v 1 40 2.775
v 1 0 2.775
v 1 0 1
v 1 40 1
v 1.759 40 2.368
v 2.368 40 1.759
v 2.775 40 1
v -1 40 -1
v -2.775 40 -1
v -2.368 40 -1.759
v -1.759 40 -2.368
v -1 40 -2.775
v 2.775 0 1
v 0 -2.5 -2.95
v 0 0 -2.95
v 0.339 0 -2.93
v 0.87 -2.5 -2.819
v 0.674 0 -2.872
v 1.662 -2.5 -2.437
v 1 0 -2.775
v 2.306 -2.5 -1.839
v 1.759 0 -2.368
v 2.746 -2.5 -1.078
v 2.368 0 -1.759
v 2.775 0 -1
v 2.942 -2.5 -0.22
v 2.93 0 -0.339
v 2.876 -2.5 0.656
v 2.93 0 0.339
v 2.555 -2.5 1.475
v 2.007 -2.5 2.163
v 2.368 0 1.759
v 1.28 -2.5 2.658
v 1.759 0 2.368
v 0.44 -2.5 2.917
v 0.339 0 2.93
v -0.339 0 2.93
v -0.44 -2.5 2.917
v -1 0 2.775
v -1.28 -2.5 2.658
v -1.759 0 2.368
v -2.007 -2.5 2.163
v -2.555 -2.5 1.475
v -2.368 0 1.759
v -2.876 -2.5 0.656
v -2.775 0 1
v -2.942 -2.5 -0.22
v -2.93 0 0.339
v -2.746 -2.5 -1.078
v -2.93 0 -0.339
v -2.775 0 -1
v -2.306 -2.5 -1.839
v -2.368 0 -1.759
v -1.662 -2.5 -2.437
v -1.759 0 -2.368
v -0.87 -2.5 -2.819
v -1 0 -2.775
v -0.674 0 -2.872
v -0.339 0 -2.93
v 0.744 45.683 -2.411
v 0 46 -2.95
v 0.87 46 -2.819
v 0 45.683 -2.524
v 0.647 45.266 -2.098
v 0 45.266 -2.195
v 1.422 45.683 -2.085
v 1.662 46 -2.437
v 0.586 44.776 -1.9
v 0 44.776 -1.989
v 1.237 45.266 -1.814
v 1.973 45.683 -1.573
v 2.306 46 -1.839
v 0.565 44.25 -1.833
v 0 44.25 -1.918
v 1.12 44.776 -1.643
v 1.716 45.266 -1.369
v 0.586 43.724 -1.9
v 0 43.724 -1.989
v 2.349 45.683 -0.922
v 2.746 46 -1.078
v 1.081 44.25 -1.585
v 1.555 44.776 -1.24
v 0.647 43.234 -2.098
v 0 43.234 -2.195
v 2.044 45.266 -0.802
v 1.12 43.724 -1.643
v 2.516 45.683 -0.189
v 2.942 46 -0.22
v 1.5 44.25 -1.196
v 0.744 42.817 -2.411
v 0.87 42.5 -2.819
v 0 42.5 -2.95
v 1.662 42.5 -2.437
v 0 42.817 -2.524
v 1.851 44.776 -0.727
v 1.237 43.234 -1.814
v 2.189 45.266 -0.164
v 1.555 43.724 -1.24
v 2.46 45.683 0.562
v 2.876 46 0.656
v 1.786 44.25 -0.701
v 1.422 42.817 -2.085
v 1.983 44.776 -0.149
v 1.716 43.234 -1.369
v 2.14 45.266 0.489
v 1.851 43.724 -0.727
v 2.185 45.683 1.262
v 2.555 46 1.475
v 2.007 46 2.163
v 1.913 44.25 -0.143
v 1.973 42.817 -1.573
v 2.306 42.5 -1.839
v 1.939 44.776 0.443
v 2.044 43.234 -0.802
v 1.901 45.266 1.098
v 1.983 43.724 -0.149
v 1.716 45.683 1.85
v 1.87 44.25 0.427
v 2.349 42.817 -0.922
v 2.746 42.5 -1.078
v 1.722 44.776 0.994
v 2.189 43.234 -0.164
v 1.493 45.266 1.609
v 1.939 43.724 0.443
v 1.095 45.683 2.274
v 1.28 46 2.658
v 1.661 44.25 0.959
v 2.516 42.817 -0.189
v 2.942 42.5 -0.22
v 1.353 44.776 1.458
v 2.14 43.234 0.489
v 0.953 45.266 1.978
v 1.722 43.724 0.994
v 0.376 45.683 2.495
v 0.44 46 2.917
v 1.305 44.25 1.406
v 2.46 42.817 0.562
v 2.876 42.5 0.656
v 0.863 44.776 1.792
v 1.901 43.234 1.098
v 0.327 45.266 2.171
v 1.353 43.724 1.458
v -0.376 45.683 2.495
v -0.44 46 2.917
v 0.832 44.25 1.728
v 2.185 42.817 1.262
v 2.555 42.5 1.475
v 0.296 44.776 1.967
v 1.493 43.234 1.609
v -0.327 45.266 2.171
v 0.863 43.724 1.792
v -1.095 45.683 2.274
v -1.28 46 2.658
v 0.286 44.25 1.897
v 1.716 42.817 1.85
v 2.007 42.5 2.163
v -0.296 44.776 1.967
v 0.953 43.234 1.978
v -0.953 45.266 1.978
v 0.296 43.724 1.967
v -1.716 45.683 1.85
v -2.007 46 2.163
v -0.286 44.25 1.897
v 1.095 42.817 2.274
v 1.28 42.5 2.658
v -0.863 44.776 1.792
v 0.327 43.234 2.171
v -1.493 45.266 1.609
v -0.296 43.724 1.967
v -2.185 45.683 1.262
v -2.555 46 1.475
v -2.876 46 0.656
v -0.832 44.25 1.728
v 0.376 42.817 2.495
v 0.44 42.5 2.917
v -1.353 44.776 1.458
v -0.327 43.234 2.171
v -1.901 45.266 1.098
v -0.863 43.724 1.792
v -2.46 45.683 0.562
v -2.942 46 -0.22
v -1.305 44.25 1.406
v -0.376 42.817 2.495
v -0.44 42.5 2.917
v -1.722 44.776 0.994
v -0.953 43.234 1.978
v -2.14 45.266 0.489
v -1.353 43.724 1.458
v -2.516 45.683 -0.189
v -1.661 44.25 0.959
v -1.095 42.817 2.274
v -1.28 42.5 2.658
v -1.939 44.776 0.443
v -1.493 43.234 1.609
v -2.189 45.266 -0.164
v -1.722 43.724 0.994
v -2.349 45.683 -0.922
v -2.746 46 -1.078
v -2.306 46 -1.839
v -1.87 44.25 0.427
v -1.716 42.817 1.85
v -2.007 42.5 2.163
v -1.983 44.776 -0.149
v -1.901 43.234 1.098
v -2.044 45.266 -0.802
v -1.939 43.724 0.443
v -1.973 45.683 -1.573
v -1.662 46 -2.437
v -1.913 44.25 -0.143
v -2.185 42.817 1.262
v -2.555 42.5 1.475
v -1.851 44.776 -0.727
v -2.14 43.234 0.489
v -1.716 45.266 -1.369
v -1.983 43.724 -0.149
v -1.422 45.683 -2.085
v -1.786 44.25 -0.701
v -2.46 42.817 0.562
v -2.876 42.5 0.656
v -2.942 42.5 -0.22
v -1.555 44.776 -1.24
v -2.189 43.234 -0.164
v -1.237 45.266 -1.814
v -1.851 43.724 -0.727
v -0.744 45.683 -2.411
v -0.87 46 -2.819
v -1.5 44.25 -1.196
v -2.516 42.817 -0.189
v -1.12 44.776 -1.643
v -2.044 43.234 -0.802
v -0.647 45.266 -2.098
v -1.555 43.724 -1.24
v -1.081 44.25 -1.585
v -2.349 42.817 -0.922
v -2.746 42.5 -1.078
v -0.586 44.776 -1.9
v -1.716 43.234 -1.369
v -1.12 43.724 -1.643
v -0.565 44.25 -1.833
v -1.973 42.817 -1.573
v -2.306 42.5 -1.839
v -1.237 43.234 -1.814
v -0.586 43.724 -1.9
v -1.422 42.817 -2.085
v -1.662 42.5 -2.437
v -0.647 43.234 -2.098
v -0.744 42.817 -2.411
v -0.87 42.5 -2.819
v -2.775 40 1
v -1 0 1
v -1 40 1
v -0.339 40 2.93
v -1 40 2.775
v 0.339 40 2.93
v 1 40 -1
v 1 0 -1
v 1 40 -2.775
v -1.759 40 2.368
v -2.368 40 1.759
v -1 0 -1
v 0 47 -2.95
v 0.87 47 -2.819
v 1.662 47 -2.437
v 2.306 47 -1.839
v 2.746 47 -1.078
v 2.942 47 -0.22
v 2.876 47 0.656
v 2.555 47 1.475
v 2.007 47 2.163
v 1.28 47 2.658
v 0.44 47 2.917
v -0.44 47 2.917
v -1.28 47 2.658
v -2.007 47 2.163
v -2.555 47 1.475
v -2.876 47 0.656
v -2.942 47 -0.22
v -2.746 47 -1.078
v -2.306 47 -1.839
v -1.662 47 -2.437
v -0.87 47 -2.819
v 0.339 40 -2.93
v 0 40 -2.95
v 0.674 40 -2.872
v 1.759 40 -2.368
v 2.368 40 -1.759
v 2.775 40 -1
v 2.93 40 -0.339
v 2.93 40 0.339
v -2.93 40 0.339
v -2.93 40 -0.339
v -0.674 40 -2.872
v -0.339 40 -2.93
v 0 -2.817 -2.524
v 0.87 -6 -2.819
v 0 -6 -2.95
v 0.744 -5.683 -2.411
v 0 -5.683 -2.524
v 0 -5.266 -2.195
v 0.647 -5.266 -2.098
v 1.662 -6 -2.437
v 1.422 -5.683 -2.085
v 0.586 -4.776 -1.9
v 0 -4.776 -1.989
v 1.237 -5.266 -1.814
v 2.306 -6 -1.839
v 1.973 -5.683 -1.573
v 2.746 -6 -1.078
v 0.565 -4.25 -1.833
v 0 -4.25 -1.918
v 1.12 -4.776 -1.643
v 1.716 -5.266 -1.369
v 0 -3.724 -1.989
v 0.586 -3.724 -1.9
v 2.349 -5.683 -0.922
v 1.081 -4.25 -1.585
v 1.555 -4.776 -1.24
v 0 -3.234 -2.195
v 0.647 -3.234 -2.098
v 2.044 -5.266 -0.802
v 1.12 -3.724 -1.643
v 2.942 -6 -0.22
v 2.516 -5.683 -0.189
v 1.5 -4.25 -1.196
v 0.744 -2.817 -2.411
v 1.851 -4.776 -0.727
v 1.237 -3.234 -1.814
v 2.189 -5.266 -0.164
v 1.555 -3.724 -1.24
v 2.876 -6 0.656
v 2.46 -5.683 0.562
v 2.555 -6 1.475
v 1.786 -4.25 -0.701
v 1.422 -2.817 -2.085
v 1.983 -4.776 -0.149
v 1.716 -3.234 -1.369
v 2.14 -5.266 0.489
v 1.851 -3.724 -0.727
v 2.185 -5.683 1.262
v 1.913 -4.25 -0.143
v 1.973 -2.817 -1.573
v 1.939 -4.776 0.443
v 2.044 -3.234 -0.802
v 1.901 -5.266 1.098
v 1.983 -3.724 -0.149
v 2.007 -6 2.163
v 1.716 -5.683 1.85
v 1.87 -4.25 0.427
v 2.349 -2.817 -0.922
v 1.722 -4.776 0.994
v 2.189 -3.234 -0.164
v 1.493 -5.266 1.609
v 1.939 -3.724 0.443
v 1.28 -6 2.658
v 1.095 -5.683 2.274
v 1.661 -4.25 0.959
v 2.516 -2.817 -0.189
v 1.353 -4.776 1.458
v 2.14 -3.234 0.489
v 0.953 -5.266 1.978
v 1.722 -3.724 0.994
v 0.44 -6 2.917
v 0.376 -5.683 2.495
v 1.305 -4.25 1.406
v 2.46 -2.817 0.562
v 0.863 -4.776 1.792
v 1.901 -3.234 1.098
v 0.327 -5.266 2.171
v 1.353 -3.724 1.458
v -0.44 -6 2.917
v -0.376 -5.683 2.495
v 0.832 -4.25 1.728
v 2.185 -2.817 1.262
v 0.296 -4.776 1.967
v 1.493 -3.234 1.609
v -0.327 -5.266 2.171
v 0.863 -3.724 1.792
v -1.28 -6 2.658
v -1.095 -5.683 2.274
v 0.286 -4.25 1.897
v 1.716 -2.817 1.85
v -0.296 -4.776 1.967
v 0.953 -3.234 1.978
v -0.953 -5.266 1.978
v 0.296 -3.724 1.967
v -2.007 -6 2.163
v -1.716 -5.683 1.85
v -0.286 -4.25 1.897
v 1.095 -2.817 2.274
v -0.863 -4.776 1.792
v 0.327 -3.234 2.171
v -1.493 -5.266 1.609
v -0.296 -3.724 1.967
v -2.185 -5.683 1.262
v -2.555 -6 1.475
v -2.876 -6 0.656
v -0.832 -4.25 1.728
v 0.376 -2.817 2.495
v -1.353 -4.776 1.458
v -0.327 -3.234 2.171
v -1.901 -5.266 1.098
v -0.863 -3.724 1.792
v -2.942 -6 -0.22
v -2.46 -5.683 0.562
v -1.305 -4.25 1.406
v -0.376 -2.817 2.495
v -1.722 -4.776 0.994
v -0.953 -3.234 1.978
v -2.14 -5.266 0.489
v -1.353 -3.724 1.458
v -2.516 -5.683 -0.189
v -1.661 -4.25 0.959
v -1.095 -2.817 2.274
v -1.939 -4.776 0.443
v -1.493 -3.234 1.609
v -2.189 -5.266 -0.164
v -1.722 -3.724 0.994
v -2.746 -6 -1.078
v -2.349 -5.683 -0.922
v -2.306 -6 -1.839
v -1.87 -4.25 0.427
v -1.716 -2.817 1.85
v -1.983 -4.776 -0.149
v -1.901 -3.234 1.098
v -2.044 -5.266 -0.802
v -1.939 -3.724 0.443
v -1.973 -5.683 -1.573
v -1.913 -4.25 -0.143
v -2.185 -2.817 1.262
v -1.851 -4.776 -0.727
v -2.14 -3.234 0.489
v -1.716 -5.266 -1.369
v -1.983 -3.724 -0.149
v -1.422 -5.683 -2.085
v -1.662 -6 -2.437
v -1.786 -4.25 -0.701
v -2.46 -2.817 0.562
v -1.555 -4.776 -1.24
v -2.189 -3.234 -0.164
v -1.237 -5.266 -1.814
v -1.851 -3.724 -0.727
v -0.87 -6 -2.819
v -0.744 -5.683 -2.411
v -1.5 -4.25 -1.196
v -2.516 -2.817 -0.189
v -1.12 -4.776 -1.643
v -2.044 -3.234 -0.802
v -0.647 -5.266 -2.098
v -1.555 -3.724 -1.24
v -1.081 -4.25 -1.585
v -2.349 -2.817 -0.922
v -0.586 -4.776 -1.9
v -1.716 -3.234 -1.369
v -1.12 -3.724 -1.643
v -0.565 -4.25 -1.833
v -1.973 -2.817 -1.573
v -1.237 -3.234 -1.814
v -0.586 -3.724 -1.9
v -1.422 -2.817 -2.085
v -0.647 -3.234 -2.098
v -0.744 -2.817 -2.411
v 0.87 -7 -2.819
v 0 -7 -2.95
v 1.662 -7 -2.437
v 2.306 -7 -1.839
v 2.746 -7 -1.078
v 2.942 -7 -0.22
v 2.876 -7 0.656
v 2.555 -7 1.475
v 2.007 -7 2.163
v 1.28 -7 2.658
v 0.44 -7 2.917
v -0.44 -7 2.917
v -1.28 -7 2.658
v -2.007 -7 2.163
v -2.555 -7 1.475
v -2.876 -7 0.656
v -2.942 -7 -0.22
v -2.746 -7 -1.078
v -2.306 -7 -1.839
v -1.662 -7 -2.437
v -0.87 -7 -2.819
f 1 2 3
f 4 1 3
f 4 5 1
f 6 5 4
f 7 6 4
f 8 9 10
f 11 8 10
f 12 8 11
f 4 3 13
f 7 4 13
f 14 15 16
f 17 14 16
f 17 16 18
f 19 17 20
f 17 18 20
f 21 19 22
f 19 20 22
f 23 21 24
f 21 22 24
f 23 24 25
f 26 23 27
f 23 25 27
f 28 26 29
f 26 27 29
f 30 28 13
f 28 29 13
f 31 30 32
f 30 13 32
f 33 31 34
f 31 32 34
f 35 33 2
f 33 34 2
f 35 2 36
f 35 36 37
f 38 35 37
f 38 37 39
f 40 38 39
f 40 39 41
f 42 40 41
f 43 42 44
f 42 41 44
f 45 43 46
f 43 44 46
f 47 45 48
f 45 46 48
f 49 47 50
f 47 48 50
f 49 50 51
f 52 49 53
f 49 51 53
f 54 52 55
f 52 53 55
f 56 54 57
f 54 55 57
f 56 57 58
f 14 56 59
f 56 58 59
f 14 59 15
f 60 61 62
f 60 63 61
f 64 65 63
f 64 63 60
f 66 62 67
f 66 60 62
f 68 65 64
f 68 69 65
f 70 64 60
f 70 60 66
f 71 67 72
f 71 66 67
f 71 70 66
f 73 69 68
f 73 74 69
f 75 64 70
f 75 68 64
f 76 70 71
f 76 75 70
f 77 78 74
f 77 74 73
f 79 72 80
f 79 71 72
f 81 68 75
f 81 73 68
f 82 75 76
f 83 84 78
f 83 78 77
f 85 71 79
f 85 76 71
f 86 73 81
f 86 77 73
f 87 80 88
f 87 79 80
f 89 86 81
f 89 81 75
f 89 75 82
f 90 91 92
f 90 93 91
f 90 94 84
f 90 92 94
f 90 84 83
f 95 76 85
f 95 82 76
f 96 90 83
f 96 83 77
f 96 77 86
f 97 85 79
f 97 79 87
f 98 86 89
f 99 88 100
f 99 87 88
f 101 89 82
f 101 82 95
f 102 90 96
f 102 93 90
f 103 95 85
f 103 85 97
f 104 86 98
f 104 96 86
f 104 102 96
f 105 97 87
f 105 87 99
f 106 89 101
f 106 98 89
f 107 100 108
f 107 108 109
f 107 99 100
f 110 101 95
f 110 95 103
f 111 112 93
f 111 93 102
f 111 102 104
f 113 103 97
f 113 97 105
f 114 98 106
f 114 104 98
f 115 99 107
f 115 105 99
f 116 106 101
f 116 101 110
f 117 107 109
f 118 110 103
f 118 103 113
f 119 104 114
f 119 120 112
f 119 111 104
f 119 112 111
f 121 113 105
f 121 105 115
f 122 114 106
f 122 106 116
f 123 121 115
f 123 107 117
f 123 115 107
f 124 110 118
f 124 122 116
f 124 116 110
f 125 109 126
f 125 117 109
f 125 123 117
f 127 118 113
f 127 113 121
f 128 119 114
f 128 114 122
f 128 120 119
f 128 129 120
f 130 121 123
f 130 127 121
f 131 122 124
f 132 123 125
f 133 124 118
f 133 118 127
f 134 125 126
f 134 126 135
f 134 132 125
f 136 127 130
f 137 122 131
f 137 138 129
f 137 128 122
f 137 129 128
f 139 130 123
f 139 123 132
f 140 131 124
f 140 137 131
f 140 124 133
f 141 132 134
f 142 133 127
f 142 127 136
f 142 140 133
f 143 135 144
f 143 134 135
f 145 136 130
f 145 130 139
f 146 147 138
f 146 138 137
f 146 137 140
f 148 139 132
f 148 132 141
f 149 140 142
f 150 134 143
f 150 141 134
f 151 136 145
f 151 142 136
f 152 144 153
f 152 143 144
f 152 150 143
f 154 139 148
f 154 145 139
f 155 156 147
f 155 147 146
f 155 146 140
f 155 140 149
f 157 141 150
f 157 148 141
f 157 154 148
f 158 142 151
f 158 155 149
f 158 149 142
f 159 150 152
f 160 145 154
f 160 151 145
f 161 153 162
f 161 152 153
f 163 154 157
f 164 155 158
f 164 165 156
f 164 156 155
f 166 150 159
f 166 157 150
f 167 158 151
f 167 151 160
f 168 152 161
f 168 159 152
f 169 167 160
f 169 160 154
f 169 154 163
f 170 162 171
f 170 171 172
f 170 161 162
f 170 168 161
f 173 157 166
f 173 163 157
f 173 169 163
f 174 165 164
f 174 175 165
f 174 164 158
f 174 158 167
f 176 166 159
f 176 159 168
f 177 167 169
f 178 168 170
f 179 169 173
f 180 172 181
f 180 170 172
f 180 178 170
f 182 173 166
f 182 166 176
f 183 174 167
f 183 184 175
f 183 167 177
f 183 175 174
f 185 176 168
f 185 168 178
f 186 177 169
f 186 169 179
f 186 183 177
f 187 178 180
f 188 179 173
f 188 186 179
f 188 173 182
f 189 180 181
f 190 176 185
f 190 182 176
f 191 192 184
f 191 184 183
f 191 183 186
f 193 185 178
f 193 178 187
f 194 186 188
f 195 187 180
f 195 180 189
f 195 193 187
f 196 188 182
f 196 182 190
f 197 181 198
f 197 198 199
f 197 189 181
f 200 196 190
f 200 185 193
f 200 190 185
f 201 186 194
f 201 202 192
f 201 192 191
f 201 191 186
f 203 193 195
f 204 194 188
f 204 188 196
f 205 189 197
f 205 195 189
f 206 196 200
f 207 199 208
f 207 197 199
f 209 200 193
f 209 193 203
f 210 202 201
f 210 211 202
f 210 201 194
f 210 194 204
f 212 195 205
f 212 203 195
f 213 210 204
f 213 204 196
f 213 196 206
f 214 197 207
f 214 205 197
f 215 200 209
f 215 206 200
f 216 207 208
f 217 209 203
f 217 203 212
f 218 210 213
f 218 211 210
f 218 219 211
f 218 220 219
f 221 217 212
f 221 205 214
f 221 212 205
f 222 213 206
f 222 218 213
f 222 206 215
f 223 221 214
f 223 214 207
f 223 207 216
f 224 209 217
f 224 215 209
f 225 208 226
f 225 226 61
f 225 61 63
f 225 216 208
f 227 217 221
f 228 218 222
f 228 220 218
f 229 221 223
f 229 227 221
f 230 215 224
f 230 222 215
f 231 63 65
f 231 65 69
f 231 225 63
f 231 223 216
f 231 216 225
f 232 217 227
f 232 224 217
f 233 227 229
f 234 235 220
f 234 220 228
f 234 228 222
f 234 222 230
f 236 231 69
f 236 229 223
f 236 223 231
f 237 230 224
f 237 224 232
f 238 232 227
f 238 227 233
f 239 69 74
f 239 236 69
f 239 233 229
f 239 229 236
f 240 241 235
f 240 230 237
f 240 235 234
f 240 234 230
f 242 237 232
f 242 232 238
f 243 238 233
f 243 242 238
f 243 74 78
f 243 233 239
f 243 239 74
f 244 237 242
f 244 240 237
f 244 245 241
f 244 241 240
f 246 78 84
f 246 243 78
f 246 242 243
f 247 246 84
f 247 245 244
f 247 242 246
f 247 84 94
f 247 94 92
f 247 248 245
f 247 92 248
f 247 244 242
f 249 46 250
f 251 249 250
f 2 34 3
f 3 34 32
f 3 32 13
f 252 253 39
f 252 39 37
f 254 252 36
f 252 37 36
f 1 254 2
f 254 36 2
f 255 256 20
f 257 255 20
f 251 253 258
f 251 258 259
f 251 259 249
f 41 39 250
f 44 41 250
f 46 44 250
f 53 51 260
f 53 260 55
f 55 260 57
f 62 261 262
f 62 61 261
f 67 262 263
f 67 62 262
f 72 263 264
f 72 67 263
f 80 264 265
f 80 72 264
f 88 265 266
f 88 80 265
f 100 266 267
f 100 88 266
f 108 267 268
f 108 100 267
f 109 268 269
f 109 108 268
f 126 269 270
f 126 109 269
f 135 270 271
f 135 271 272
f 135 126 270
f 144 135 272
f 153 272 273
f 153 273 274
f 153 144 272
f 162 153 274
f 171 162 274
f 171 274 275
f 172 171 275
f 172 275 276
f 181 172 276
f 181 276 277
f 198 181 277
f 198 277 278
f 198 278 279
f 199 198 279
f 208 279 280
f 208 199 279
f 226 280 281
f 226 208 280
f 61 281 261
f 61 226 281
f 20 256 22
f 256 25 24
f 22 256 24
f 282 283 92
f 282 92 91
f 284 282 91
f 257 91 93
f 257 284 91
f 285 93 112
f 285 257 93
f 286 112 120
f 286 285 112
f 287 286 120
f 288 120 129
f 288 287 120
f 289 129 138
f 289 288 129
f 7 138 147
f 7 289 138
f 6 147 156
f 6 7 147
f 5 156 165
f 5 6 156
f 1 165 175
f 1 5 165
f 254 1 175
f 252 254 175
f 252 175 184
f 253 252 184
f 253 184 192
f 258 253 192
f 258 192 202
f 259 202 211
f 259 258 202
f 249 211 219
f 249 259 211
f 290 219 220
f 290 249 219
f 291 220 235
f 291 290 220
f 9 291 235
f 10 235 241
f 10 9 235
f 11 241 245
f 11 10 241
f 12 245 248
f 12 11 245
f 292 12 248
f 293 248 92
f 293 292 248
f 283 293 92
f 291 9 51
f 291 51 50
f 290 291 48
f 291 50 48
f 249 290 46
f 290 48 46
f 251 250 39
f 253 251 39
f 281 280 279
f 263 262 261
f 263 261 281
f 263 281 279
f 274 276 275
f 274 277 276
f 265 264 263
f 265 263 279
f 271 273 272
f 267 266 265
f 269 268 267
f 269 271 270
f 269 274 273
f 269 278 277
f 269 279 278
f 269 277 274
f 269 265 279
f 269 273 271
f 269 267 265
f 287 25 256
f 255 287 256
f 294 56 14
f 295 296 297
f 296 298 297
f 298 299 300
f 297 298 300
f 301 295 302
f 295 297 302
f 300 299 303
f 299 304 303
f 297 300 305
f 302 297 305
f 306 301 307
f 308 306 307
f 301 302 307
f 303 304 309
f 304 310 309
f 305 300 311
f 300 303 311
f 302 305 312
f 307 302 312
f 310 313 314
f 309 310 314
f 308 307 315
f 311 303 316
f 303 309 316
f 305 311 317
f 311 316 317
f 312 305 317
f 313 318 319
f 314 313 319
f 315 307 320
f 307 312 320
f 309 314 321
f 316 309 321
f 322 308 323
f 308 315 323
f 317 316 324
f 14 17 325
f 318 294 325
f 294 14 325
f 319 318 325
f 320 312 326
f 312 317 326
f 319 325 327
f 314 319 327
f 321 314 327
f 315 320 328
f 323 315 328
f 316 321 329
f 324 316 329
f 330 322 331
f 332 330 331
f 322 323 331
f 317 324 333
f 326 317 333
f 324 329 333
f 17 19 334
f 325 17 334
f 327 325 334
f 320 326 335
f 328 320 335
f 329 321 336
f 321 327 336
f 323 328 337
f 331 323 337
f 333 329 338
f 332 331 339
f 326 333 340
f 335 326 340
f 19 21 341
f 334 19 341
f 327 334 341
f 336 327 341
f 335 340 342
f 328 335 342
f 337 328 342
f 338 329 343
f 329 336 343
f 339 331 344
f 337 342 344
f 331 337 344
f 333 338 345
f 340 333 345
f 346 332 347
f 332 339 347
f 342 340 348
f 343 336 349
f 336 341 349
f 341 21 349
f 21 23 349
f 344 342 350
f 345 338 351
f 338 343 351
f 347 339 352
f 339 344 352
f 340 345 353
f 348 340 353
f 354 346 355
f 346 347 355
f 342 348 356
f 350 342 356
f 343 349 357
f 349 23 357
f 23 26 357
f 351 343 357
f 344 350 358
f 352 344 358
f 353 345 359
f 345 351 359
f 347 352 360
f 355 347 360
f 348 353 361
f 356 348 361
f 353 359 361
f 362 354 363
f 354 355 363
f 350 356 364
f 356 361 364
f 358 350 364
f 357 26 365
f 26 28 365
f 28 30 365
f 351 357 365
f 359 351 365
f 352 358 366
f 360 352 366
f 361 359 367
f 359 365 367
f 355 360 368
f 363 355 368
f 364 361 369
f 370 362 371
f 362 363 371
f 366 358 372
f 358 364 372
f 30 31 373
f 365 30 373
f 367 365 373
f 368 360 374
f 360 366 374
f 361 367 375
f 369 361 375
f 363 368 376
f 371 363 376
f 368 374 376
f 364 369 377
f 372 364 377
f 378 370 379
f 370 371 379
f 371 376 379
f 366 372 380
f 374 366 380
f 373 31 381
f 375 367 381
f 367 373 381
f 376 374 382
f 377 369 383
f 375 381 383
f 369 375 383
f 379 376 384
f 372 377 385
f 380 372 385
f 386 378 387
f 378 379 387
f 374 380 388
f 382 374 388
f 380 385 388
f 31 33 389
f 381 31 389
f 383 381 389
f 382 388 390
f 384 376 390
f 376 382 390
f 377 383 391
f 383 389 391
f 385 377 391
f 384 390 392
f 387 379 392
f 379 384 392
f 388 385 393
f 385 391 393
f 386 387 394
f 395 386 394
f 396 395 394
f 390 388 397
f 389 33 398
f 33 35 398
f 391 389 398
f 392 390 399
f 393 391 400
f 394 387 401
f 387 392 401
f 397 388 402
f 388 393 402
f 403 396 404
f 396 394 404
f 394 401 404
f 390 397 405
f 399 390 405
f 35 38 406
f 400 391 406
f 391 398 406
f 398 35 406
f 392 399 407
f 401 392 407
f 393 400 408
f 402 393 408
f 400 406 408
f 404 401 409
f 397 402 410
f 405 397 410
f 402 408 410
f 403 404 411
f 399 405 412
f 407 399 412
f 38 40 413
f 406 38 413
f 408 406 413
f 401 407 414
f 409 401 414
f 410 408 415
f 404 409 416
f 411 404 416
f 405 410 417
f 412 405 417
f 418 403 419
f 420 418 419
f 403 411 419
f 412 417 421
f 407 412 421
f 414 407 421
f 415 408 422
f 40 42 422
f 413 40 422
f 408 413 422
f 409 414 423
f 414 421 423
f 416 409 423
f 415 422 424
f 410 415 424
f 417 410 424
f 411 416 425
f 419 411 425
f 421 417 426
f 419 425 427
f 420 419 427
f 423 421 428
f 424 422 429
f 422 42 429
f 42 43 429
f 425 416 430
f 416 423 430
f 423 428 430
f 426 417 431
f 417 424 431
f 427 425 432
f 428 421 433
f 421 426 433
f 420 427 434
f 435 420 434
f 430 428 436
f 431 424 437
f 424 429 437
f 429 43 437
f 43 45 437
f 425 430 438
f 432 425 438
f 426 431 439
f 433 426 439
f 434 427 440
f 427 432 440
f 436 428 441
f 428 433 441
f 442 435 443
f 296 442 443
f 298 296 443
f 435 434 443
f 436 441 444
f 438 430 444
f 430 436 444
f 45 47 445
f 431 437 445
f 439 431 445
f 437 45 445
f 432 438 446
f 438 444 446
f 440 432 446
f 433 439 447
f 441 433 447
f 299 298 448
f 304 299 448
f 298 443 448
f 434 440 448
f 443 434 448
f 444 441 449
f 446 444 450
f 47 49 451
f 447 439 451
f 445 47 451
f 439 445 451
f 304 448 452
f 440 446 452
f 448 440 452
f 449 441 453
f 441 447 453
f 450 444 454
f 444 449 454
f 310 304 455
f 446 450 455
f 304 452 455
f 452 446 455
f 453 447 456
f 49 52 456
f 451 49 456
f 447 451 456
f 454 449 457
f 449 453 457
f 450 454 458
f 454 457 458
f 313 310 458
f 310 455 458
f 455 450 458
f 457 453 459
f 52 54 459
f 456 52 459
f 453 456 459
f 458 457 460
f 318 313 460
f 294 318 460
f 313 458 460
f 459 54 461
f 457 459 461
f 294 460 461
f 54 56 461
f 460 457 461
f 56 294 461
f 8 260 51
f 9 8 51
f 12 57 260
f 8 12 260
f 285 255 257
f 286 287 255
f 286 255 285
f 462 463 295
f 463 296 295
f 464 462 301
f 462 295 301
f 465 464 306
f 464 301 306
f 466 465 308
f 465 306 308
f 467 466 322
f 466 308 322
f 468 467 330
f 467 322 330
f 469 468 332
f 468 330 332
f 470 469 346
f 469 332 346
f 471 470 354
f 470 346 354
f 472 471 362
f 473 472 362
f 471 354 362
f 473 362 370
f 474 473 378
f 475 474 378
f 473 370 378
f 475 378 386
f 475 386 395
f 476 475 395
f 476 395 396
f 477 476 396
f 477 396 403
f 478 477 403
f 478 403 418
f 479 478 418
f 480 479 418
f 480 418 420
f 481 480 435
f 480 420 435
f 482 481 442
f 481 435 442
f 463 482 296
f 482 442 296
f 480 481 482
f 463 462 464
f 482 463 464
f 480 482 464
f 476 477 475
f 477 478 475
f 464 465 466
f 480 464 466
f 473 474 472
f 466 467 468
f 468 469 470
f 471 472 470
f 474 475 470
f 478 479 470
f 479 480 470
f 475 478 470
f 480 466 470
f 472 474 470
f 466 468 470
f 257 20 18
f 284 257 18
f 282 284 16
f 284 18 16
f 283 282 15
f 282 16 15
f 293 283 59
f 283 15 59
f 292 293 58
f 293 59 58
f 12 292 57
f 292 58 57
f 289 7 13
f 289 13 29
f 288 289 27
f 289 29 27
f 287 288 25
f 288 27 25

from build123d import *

# Parameters (mm, degrees)
EXTRUDE_2_DEPTH = 40


with BuildPart() as part:
    # 草图1 → 凸台-拉伸2 (new body)
    with BuildSketch(Plane(origin=(0, 0, 0), x_dir=(1, 0, 0), z_dir=(0, 1, 0))):
        with BuildLine():
            Line((1, 1), (1, 2.775338))
            ThreePointArc((1, 2.775338), (0, 2.95), (-1, 2.775338))
            Line((-1, 2.775338), (-1, 1))
            Line((-1, 1), (-2.775338, 1))
            ThreePointArc((-2.775338, 1), (-2.95, 0), (-2.775338, -1))
            Line((-2.775338, -1), (-1, -1))
            Line((-1, -1), (-1, -2.775338))
            ThreePointArc((-1, -2.775338), (0, -2.95), (1, -2.775338))
            Line((1, -2.775338), (1, -1))
            Line((1, -1), (2.775338, -1))
            ThreePointArc((2.775338, -1), (2.95, 0), (2.775338, 1))
            Line((2.775338, 1), (1, 1))
        make_face()
    extrude(amount=EXTRUDE_2_DEPTH)

    # 草图3 → 旋转3 (revolve)
    with BuildSketch(Plane(origin=(0, 0, 0), x_dir=(0, 0, -1), z_dir=(1, 0, 0))):
        with BuildLine():
            Line((0, 40), (0, 47))
            Line((0, 47), (2.95, 47))
            Line((2.95, 47), (2.95, 46))
            ThreePointArc((2.95, 46), (1.918246, 44.25), (2.95, 42.5))
            Line((2.95, 42.5), (2.95, 40))
            Line((2.95, 40), (0, 40))
        make_face()
        with BuildLine():
            Line((0, 0), (0, -7))
            Line((0, -7), (2.95, -7))
            Line((2.95, -7), (2.95, -6))
            ThreePointArc((2.95, -6), (1.918246, -4.25), (2.95, -2.5))
            Line((2.95, -2.5), (2.95, 0))
            Line((2.95, 0), (0, 0))
        make_face()
    revolve(axis=Axis((0, 0, 0), (0, -1, 0)))


solid = part.part
